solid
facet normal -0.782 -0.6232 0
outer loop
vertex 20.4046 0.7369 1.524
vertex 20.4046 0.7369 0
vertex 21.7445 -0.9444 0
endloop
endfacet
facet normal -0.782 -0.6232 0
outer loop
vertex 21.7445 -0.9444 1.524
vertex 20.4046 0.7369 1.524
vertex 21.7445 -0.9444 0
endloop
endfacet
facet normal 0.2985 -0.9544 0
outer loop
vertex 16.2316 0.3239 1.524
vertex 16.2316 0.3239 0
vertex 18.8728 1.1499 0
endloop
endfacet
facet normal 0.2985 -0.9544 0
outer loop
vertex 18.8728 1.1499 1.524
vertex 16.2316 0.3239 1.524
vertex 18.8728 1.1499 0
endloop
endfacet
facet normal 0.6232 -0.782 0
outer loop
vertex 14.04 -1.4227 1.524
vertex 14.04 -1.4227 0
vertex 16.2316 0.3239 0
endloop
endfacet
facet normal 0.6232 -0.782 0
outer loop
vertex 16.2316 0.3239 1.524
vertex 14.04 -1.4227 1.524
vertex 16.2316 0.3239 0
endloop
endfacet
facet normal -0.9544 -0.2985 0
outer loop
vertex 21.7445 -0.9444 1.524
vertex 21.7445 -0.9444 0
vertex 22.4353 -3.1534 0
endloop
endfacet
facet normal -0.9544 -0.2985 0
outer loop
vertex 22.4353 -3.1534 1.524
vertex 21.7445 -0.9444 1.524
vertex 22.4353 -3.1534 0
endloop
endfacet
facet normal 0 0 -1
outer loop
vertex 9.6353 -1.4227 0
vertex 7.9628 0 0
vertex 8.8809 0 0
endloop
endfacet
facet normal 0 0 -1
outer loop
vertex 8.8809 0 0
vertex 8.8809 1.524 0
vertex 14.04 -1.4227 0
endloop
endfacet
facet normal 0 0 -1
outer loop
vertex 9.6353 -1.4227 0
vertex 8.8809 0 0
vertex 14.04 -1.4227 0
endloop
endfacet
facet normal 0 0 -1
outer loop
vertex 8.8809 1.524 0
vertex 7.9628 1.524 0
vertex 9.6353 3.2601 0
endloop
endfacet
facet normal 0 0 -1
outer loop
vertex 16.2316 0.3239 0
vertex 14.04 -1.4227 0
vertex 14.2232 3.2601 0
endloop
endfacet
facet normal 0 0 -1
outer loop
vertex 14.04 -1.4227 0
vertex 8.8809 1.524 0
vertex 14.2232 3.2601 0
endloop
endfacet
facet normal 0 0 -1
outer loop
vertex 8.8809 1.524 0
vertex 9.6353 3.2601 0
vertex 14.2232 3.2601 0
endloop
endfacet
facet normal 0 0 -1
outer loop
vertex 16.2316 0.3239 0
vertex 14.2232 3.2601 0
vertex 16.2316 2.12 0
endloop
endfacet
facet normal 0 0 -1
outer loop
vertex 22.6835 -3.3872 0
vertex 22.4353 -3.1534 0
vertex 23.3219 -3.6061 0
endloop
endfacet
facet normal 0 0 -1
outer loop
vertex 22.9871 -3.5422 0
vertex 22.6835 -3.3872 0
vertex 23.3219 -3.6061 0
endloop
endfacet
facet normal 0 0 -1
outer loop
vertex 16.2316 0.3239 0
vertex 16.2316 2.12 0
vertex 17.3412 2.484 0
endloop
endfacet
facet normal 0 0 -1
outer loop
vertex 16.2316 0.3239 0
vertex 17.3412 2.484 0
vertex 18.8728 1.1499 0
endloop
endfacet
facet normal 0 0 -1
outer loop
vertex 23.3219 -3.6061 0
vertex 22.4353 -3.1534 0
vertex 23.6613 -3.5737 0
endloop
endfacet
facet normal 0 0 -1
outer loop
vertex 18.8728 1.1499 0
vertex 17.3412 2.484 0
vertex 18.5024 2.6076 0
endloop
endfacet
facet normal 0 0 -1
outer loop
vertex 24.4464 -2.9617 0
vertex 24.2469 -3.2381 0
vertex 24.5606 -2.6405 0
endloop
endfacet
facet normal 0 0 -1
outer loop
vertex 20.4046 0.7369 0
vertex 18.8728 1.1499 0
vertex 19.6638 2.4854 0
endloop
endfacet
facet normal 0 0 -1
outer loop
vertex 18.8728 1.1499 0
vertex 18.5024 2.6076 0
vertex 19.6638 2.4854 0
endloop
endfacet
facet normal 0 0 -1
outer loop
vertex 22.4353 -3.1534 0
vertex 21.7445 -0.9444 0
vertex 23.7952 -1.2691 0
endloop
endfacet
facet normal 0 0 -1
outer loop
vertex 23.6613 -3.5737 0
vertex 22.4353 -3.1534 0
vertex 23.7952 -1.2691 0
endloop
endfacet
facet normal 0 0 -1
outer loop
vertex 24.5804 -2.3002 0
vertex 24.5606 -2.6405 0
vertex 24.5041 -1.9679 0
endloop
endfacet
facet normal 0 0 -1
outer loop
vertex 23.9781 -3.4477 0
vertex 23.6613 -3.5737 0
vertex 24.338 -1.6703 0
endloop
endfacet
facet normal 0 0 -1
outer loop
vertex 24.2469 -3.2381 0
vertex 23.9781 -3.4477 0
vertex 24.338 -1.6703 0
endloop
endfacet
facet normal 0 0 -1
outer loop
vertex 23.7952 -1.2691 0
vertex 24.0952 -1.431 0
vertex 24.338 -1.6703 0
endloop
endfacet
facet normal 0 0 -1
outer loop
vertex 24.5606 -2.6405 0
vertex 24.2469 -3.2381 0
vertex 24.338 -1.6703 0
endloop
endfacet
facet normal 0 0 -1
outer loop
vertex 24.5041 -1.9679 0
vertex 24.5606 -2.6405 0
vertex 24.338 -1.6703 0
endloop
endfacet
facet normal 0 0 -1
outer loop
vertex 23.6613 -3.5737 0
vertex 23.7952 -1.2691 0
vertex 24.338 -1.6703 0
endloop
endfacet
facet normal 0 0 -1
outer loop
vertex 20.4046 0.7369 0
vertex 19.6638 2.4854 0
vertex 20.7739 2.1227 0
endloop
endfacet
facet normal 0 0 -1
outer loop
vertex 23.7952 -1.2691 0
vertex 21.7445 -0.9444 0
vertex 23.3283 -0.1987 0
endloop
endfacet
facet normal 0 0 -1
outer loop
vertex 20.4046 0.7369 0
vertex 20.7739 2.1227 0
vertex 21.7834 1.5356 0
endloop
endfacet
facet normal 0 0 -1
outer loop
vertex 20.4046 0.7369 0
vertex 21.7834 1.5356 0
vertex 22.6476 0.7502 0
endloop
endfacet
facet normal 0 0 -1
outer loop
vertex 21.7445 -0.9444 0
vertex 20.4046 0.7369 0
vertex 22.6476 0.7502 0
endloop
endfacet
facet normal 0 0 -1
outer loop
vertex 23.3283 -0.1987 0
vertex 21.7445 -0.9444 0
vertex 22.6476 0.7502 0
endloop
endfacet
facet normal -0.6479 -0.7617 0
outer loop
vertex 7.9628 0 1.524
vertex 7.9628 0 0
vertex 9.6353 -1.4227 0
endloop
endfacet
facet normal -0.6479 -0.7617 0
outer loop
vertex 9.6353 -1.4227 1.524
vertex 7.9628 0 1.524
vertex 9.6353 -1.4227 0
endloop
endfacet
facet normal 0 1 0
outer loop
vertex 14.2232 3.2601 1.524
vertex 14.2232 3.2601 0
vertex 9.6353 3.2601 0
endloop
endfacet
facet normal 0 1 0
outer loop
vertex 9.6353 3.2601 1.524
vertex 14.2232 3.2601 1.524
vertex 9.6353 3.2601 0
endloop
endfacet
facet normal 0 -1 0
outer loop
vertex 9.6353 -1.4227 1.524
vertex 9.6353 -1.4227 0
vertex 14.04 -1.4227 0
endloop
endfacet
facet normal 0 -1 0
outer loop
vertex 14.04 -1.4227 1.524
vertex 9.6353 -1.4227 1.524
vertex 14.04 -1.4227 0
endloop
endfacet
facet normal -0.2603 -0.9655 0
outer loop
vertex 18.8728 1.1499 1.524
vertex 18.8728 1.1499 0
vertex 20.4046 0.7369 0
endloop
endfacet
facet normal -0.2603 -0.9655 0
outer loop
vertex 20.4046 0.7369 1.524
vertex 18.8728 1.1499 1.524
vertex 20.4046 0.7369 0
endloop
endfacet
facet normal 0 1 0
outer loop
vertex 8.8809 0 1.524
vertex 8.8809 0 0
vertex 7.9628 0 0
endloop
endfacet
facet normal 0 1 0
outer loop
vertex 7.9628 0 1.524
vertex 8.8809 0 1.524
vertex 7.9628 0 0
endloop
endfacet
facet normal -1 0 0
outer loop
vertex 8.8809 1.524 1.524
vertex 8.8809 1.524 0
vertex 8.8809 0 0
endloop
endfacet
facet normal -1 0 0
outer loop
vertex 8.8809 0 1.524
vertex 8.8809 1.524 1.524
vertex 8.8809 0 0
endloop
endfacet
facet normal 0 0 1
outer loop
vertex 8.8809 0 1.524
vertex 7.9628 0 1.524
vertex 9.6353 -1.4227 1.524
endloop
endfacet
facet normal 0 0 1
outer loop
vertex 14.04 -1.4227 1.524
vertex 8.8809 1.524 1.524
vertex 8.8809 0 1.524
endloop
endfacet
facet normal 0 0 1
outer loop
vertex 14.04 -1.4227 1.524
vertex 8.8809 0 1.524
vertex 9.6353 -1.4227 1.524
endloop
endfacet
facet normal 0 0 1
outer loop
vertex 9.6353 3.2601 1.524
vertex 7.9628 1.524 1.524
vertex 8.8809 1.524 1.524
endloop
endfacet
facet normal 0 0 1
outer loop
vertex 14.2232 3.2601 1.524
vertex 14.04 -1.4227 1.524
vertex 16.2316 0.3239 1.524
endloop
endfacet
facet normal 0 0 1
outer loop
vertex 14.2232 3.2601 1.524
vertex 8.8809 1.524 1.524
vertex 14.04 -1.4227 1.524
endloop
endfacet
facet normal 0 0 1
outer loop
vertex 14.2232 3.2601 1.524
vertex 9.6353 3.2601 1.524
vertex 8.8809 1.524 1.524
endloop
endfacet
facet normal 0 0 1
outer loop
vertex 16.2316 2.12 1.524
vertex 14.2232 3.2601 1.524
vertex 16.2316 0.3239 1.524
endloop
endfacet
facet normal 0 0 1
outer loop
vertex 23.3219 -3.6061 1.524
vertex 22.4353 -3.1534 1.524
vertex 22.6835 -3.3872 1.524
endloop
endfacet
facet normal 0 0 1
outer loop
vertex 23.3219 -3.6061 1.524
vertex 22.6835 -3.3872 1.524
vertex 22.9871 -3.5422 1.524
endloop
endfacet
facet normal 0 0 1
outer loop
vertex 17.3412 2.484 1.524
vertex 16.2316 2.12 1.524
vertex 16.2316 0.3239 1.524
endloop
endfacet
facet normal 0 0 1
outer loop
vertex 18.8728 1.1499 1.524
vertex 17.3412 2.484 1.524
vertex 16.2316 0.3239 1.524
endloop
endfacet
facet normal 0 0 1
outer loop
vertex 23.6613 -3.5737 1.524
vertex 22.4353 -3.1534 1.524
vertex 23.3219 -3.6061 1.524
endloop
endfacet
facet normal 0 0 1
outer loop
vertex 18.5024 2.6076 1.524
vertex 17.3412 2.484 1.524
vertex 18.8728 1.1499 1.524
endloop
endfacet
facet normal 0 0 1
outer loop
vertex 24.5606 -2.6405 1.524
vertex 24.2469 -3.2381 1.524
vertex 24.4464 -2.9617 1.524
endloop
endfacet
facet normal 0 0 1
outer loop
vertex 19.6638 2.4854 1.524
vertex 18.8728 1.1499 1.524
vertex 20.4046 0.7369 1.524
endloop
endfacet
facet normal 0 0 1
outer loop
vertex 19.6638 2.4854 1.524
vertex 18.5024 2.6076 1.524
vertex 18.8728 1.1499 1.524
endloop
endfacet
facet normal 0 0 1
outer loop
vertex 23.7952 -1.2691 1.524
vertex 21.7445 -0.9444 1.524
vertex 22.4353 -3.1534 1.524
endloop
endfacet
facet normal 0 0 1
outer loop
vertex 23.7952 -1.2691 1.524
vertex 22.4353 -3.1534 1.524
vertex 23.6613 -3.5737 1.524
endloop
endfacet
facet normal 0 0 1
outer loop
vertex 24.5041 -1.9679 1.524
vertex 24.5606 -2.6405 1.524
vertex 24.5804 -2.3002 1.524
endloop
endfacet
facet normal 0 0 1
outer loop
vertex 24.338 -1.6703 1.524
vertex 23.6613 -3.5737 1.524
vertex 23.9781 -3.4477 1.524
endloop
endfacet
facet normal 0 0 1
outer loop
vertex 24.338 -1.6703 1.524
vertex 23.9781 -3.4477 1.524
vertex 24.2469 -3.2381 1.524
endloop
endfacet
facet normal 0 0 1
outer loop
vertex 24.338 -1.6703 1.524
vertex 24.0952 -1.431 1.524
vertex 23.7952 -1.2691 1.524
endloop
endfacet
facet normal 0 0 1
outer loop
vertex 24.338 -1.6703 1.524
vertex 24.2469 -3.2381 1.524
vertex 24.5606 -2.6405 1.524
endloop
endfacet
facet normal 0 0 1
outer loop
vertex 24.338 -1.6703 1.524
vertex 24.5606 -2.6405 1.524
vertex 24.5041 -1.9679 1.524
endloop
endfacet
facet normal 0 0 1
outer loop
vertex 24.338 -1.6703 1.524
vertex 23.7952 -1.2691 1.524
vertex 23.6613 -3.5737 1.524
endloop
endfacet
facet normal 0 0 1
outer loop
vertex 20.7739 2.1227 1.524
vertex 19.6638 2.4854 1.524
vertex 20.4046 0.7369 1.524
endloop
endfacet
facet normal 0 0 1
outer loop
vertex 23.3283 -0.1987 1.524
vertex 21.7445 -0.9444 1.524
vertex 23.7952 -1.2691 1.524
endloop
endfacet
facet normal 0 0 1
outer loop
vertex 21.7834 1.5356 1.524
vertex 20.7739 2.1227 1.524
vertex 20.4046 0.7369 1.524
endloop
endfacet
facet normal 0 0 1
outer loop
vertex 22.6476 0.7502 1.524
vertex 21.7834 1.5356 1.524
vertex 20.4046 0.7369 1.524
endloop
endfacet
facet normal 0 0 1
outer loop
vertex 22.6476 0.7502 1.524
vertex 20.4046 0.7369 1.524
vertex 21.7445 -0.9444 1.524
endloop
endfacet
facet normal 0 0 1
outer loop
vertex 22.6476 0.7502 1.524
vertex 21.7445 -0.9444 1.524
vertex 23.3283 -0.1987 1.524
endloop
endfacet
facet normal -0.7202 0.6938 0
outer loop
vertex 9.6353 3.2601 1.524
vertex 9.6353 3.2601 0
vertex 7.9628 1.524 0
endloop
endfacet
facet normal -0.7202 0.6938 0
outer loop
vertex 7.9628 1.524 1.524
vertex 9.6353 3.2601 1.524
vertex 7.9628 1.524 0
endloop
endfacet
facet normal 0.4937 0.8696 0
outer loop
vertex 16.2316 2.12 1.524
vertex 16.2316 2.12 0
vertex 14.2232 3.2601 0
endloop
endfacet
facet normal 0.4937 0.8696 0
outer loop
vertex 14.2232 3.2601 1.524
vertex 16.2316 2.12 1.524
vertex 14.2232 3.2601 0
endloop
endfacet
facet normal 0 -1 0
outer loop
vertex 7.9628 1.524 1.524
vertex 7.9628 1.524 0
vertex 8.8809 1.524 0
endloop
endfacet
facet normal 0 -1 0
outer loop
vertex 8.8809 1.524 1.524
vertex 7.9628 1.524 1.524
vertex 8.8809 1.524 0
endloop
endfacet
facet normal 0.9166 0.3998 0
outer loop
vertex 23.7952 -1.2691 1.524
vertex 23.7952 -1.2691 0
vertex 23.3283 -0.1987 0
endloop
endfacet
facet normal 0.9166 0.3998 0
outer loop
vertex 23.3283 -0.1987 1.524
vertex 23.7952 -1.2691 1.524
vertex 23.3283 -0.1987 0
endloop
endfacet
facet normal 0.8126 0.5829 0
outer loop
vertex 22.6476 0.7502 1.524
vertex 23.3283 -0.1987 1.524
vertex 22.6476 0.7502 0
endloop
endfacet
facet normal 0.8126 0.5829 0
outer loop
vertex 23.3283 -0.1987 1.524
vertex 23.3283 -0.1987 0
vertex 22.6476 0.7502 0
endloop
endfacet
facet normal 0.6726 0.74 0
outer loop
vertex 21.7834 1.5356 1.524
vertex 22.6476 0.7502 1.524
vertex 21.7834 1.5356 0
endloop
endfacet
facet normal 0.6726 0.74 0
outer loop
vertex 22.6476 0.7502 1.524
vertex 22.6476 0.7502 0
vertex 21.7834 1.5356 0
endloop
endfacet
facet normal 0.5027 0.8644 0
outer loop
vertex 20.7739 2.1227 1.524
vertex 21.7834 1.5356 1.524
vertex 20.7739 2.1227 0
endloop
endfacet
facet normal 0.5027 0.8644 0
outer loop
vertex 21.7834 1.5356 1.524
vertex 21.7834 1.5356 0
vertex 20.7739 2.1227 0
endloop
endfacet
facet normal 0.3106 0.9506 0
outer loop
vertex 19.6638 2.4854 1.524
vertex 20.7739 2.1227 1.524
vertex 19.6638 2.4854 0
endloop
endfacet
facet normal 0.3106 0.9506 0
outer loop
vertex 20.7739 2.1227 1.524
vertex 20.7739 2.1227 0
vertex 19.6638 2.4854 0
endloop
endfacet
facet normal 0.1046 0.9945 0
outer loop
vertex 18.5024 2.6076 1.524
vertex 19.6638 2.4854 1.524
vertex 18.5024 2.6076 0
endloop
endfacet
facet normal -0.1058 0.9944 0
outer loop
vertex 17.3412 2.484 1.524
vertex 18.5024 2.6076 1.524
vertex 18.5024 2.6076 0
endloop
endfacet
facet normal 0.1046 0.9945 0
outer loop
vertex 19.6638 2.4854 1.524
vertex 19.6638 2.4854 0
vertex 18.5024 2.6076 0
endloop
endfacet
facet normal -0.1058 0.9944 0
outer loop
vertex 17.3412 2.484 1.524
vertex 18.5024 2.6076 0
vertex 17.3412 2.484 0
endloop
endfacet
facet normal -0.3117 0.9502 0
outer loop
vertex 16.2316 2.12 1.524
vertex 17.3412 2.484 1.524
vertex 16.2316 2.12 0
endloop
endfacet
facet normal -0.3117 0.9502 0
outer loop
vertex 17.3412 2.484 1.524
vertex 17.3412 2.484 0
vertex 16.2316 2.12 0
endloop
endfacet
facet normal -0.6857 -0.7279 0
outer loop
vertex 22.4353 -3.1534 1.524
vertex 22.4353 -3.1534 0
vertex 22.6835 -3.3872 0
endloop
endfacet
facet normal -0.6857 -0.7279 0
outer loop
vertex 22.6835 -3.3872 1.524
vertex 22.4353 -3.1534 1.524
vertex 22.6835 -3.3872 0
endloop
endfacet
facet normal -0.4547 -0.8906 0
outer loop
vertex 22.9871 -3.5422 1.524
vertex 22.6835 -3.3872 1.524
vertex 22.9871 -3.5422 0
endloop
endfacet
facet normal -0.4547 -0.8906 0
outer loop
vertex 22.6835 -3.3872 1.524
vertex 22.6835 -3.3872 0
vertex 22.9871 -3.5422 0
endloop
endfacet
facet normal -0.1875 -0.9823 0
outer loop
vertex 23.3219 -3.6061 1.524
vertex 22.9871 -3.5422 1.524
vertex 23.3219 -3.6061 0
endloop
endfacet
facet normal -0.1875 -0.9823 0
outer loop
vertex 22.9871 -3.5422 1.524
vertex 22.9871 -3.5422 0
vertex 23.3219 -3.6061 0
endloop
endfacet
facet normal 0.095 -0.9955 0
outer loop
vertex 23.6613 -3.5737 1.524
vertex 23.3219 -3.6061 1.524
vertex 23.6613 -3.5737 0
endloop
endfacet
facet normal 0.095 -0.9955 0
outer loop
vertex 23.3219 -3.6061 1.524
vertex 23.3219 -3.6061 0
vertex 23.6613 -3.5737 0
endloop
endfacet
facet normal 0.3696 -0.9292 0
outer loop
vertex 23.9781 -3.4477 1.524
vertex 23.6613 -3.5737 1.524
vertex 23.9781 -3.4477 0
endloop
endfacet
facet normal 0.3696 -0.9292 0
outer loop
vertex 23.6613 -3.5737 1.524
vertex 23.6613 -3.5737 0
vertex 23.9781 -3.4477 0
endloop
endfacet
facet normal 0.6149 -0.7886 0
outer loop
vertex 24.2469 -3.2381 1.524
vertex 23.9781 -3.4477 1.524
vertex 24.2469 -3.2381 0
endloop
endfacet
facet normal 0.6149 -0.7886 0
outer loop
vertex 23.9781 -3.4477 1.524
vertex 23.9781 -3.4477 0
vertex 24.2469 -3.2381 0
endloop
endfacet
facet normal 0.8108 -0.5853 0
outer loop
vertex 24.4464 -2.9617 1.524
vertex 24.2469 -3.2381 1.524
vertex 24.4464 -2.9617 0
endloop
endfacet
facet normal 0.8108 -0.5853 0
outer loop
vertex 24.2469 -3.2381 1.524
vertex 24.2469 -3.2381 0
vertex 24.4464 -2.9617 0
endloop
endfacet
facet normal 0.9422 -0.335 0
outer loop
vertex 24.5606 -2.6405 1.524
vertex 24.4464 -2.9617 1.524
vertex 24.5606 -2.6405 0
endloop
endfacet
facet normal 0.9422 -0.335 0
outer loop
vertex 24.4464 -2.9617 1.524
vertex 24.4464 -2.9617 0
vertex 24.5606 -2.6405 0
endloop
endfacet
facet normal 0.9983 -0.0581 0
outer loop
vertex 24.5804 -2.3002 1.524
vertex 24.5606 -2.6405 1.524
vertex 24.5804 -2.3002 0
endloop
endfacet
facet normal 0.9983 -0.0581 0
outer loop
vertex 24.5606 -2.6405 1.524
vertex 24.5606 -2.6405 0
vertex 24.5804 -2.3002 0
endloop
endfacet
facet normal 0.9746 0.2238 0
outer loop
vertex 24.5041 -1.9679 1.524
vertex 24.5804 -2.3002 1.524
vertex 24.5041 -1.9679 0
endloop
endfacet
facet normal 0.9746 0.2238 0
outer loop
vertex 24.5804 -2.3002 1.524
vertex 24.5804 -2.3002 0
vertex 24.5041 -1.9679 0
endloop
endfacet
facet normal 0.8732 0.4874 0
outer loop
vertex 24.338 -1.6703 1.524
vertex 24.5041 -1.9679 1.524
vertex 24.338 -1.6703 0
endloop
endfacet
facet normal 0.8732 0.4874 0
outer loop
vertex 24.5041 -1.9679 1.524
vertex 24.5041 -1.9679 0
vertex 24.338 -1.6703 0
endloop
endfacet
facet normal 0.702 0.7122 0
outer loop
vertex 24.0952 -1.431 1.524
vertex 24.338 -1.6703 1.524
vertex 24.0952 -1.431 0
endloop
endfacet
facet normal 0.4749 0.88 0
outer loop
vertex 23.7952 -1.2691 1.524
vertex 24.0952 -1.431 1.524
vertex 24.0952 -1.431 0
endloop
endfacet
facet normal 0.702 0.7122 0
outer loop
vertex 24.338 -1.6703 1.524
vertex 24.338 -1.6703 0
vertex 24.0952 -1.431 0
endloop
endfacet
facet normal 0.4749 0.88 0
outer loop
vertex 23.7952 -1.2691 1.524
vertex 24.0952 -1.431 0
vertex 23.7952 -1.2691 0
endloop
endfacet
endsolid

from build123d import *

# Parameters (mm, degrees)
BOSS_EXTRUDE1_DEPTH = 1.524


with BuildPart() as part:
    # Sketch1 → Boss-Extrude1 (new body)
    with BuildSketch(Plane.XY):
        with BuildLine():
            Line((8.880896155, 0), (7.962755207, 0))
            Line((7.962755207, 0), (9.635264959, -1.422689942))
            Line((9.635264959, -1.422689942), (14.039974044, -1.422689942))
            Line((14.039974044, -1.422689942), (16.231554776, 0.32393337))
            Line((16.231554776, 0.32393337), (18.872756066, 1.149856497))
            Line((18.872756066, 1.149856497), (20.404642344, 0.736894933))
            Line((20.404642344, 0.736894933), (21.744548774, -0.944356596))
            Line((21.744548774, -0.944356596), (22.435346644, -3.153443817))
            ThreePointArc((22.435346644, -3.153443817), (24.356473743, -3.107008643), (23.795164322, -1.269124727))
            ThreePointArc((23.795164322, -1.269124727), (20.773869568, 2.122690239), (16.231554776, 2.120028069))
            Line((16.231554776, 2.120028069), (14.223210267, 3.260079698))
            Line((14.223210267, 3.260079698), (9.635264959, 3.260079698))
            Line((9.635264959, 3.260079698), (7.962755207, 1.524))
            Line((7.962755207, 1.524), (8.880896155, 1.524))
            Line((8.880896155, 1.524), (8.880896155, 0))
        make_face()
    extrude(amount=BOSS_EXTRUDE1_DEPTH)


solid = part.part
